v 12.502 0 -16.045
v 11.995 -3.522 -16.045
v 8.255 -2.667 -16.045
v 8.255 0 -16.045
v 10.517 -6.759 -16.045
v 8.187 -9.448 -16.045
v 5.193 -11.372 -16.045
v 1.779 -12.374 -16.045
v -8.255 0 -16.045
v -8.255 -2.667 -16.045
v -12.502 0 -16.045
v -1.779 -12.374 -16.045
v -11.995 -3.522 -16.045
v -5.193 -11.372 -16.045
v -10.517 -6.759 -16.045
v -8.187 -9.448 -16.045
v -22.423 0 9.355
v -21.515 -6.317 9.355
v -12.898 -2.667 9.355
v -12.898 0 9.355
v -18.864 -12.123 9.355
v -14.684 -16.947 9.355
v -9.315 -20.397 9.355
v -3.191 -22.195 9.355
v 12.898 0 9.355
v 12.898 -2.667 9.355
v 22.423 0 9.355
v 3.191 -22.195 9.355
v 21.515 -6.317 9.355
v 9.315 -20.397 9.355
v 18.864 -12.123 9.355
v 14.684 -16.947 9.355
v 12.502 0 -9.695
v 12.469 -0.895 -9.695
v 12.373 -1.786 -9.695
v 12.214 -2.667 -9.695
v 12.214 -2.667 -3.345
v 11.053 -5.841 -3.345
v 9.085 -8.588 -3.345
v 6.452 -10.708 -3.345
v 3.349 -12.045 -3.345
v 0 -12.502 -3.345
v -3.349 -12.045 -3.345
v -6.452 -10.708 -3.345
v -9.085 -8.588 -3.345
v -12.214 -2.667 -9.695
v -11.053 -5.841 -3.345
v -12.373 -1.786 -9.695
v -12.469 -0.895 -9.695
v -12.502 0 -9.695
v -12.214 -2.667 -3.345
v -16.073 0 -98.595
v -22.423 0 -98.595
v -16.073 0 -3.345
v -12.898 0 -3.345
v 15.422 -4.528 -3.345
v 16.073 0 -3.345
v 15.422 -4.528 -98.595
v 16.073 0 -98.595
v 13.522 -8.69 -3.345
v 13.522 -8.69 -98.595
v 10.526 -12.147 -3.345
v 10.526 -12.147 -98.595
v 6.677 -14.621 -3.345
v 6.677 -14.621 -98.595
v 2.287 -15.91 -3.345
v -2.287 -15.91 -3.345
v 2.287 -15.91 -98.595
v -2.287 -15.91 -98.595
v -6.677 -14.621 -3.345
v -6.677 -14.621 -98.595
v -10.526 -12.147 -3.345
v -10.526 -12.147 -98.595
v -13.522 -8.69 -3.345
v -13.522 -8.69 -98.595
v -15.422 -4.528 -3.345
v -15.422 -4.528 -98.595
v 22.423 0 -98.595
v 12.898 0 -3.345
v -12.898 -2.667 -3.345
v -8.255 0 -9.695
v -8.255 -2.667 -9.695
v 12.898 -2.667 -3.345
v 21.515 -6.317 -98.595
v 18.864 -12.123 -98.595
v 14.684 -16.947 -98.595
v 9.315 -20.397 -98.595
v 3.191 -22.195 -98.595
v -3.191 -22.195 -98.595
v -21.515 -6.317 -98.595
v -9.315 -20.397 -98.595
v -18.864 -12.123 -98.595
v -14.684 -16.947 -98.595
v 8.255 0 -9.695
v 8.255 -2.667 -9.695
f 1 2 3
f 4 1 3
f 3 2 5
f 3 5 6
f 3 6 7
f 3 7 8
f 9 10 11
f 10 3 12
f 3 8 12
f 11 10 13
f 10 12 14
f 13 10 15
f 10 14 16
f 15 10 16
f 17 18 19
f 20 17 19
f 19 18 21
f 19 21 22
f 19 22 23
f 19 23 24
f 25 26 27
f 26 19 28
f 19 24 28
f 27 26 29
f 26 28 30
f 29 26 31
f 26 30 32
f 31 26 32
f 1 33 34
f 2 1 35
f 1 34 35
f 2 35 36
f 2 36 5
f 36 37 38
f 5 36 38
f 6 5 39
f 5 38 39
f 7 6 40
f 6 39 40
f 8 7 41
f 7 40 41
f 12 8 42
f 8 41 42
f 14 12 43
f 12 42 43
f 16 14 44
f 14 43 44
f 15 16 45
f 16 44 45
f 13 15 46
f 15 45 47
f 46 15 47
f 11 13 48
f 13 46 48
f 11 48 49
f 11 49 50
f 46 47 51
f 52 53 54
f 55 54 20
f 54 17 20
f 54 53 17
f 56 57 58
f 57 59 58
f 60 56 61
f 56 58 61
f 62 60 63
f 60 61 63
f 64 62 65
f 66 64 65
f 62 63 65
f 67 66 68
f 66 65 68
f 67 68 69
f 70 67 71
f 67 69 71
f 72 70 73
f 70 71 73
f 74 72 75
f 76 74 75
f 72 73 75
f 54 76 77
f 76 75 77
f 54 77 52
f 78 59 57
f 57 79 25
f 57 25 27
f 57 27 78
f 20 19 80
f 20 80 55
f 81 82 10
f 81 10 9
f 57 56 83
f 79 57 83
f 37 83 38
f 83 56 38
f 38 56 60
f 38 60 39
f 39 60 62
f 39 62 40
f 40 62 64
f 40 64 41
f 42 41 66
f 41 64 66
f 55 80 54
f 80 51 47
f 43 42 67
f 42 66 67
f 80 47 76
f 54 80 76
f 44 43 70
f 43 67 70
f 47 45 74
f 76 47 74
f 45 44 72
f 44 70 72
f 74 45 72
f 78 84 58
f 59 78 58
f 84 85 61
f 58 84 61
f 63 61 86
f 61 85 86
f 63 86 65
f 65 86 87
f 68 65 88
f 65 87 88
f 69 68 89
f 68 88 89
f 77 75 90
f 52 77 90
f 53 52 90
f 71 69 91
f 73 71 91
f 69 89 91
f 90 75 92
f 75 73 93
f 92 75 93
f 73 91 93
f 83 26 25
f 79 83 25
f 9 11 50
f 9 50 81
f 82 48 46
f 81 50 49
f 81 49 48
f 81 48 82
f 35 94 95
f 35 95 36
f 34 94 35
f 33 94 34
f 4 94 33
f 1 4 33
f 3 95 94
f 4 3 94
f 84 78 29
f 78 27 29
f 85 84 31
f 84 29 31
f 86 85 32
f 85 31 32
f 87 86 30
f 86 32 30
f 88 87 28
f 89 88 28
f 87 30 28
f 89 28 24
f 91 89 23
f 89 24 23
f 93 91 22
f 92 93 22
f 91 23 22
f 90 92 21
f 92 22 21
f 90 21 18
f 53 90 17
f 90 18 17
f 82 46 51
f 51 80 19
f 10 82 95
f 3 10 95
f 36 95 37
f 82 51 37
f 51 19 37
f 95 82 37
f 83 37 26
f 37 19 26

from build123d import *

# Parameters (mm, degrees)
F1_ANGLE = 180
F2_W     = 16.51
F2_H     = 2.667
F3_DEPTH = 25.4
F2_W_2   = 4.643438
F4_DEPTH = 19.05


with BuildPart() as f1:
    # F0 (on Front) → F1 (revolve)
    with BuildSketch(Plane.XZ):
        Polygon((16.073437, -3.344848), (16.073438, -98.594848), (22.423438, -98.594848), (22.423438, 9.355152), (0, 9.355152), (0, -16.044848), (12.501562, -16.044848), (12.501562, -3.344848), align=None)
    revolve(axis=Axis((0, 0, -3.344848), (0, 0, -1)), revolution_arc=F1_ANGLE)

    # F2 (on face) → F3 (cut, through all)
    with BuildSketch(Plane.XY.offset(9.355152)):
        with Locations((0, -1.3335)):
            Rectangle(F2_W, F2_H)
    extrude(amount=-F3_DEPTH, mode=Mode.SUBTRACT)

    # F2 (on face) → F4 (cut)
    with BuildSketch(Plane.XY.offset(9.355152)):
        with Locations((10.576719, -1.3335)):
            Rectangle(F2_W_2, F2_H)
        with Locations((-10.576719, -1.3335)):
            Rectangle(F2_W_2, F2_H)
    extrude(amount=-F4_DEPTH, mode=Mode.SUBTRACT)


solid = f1.part
